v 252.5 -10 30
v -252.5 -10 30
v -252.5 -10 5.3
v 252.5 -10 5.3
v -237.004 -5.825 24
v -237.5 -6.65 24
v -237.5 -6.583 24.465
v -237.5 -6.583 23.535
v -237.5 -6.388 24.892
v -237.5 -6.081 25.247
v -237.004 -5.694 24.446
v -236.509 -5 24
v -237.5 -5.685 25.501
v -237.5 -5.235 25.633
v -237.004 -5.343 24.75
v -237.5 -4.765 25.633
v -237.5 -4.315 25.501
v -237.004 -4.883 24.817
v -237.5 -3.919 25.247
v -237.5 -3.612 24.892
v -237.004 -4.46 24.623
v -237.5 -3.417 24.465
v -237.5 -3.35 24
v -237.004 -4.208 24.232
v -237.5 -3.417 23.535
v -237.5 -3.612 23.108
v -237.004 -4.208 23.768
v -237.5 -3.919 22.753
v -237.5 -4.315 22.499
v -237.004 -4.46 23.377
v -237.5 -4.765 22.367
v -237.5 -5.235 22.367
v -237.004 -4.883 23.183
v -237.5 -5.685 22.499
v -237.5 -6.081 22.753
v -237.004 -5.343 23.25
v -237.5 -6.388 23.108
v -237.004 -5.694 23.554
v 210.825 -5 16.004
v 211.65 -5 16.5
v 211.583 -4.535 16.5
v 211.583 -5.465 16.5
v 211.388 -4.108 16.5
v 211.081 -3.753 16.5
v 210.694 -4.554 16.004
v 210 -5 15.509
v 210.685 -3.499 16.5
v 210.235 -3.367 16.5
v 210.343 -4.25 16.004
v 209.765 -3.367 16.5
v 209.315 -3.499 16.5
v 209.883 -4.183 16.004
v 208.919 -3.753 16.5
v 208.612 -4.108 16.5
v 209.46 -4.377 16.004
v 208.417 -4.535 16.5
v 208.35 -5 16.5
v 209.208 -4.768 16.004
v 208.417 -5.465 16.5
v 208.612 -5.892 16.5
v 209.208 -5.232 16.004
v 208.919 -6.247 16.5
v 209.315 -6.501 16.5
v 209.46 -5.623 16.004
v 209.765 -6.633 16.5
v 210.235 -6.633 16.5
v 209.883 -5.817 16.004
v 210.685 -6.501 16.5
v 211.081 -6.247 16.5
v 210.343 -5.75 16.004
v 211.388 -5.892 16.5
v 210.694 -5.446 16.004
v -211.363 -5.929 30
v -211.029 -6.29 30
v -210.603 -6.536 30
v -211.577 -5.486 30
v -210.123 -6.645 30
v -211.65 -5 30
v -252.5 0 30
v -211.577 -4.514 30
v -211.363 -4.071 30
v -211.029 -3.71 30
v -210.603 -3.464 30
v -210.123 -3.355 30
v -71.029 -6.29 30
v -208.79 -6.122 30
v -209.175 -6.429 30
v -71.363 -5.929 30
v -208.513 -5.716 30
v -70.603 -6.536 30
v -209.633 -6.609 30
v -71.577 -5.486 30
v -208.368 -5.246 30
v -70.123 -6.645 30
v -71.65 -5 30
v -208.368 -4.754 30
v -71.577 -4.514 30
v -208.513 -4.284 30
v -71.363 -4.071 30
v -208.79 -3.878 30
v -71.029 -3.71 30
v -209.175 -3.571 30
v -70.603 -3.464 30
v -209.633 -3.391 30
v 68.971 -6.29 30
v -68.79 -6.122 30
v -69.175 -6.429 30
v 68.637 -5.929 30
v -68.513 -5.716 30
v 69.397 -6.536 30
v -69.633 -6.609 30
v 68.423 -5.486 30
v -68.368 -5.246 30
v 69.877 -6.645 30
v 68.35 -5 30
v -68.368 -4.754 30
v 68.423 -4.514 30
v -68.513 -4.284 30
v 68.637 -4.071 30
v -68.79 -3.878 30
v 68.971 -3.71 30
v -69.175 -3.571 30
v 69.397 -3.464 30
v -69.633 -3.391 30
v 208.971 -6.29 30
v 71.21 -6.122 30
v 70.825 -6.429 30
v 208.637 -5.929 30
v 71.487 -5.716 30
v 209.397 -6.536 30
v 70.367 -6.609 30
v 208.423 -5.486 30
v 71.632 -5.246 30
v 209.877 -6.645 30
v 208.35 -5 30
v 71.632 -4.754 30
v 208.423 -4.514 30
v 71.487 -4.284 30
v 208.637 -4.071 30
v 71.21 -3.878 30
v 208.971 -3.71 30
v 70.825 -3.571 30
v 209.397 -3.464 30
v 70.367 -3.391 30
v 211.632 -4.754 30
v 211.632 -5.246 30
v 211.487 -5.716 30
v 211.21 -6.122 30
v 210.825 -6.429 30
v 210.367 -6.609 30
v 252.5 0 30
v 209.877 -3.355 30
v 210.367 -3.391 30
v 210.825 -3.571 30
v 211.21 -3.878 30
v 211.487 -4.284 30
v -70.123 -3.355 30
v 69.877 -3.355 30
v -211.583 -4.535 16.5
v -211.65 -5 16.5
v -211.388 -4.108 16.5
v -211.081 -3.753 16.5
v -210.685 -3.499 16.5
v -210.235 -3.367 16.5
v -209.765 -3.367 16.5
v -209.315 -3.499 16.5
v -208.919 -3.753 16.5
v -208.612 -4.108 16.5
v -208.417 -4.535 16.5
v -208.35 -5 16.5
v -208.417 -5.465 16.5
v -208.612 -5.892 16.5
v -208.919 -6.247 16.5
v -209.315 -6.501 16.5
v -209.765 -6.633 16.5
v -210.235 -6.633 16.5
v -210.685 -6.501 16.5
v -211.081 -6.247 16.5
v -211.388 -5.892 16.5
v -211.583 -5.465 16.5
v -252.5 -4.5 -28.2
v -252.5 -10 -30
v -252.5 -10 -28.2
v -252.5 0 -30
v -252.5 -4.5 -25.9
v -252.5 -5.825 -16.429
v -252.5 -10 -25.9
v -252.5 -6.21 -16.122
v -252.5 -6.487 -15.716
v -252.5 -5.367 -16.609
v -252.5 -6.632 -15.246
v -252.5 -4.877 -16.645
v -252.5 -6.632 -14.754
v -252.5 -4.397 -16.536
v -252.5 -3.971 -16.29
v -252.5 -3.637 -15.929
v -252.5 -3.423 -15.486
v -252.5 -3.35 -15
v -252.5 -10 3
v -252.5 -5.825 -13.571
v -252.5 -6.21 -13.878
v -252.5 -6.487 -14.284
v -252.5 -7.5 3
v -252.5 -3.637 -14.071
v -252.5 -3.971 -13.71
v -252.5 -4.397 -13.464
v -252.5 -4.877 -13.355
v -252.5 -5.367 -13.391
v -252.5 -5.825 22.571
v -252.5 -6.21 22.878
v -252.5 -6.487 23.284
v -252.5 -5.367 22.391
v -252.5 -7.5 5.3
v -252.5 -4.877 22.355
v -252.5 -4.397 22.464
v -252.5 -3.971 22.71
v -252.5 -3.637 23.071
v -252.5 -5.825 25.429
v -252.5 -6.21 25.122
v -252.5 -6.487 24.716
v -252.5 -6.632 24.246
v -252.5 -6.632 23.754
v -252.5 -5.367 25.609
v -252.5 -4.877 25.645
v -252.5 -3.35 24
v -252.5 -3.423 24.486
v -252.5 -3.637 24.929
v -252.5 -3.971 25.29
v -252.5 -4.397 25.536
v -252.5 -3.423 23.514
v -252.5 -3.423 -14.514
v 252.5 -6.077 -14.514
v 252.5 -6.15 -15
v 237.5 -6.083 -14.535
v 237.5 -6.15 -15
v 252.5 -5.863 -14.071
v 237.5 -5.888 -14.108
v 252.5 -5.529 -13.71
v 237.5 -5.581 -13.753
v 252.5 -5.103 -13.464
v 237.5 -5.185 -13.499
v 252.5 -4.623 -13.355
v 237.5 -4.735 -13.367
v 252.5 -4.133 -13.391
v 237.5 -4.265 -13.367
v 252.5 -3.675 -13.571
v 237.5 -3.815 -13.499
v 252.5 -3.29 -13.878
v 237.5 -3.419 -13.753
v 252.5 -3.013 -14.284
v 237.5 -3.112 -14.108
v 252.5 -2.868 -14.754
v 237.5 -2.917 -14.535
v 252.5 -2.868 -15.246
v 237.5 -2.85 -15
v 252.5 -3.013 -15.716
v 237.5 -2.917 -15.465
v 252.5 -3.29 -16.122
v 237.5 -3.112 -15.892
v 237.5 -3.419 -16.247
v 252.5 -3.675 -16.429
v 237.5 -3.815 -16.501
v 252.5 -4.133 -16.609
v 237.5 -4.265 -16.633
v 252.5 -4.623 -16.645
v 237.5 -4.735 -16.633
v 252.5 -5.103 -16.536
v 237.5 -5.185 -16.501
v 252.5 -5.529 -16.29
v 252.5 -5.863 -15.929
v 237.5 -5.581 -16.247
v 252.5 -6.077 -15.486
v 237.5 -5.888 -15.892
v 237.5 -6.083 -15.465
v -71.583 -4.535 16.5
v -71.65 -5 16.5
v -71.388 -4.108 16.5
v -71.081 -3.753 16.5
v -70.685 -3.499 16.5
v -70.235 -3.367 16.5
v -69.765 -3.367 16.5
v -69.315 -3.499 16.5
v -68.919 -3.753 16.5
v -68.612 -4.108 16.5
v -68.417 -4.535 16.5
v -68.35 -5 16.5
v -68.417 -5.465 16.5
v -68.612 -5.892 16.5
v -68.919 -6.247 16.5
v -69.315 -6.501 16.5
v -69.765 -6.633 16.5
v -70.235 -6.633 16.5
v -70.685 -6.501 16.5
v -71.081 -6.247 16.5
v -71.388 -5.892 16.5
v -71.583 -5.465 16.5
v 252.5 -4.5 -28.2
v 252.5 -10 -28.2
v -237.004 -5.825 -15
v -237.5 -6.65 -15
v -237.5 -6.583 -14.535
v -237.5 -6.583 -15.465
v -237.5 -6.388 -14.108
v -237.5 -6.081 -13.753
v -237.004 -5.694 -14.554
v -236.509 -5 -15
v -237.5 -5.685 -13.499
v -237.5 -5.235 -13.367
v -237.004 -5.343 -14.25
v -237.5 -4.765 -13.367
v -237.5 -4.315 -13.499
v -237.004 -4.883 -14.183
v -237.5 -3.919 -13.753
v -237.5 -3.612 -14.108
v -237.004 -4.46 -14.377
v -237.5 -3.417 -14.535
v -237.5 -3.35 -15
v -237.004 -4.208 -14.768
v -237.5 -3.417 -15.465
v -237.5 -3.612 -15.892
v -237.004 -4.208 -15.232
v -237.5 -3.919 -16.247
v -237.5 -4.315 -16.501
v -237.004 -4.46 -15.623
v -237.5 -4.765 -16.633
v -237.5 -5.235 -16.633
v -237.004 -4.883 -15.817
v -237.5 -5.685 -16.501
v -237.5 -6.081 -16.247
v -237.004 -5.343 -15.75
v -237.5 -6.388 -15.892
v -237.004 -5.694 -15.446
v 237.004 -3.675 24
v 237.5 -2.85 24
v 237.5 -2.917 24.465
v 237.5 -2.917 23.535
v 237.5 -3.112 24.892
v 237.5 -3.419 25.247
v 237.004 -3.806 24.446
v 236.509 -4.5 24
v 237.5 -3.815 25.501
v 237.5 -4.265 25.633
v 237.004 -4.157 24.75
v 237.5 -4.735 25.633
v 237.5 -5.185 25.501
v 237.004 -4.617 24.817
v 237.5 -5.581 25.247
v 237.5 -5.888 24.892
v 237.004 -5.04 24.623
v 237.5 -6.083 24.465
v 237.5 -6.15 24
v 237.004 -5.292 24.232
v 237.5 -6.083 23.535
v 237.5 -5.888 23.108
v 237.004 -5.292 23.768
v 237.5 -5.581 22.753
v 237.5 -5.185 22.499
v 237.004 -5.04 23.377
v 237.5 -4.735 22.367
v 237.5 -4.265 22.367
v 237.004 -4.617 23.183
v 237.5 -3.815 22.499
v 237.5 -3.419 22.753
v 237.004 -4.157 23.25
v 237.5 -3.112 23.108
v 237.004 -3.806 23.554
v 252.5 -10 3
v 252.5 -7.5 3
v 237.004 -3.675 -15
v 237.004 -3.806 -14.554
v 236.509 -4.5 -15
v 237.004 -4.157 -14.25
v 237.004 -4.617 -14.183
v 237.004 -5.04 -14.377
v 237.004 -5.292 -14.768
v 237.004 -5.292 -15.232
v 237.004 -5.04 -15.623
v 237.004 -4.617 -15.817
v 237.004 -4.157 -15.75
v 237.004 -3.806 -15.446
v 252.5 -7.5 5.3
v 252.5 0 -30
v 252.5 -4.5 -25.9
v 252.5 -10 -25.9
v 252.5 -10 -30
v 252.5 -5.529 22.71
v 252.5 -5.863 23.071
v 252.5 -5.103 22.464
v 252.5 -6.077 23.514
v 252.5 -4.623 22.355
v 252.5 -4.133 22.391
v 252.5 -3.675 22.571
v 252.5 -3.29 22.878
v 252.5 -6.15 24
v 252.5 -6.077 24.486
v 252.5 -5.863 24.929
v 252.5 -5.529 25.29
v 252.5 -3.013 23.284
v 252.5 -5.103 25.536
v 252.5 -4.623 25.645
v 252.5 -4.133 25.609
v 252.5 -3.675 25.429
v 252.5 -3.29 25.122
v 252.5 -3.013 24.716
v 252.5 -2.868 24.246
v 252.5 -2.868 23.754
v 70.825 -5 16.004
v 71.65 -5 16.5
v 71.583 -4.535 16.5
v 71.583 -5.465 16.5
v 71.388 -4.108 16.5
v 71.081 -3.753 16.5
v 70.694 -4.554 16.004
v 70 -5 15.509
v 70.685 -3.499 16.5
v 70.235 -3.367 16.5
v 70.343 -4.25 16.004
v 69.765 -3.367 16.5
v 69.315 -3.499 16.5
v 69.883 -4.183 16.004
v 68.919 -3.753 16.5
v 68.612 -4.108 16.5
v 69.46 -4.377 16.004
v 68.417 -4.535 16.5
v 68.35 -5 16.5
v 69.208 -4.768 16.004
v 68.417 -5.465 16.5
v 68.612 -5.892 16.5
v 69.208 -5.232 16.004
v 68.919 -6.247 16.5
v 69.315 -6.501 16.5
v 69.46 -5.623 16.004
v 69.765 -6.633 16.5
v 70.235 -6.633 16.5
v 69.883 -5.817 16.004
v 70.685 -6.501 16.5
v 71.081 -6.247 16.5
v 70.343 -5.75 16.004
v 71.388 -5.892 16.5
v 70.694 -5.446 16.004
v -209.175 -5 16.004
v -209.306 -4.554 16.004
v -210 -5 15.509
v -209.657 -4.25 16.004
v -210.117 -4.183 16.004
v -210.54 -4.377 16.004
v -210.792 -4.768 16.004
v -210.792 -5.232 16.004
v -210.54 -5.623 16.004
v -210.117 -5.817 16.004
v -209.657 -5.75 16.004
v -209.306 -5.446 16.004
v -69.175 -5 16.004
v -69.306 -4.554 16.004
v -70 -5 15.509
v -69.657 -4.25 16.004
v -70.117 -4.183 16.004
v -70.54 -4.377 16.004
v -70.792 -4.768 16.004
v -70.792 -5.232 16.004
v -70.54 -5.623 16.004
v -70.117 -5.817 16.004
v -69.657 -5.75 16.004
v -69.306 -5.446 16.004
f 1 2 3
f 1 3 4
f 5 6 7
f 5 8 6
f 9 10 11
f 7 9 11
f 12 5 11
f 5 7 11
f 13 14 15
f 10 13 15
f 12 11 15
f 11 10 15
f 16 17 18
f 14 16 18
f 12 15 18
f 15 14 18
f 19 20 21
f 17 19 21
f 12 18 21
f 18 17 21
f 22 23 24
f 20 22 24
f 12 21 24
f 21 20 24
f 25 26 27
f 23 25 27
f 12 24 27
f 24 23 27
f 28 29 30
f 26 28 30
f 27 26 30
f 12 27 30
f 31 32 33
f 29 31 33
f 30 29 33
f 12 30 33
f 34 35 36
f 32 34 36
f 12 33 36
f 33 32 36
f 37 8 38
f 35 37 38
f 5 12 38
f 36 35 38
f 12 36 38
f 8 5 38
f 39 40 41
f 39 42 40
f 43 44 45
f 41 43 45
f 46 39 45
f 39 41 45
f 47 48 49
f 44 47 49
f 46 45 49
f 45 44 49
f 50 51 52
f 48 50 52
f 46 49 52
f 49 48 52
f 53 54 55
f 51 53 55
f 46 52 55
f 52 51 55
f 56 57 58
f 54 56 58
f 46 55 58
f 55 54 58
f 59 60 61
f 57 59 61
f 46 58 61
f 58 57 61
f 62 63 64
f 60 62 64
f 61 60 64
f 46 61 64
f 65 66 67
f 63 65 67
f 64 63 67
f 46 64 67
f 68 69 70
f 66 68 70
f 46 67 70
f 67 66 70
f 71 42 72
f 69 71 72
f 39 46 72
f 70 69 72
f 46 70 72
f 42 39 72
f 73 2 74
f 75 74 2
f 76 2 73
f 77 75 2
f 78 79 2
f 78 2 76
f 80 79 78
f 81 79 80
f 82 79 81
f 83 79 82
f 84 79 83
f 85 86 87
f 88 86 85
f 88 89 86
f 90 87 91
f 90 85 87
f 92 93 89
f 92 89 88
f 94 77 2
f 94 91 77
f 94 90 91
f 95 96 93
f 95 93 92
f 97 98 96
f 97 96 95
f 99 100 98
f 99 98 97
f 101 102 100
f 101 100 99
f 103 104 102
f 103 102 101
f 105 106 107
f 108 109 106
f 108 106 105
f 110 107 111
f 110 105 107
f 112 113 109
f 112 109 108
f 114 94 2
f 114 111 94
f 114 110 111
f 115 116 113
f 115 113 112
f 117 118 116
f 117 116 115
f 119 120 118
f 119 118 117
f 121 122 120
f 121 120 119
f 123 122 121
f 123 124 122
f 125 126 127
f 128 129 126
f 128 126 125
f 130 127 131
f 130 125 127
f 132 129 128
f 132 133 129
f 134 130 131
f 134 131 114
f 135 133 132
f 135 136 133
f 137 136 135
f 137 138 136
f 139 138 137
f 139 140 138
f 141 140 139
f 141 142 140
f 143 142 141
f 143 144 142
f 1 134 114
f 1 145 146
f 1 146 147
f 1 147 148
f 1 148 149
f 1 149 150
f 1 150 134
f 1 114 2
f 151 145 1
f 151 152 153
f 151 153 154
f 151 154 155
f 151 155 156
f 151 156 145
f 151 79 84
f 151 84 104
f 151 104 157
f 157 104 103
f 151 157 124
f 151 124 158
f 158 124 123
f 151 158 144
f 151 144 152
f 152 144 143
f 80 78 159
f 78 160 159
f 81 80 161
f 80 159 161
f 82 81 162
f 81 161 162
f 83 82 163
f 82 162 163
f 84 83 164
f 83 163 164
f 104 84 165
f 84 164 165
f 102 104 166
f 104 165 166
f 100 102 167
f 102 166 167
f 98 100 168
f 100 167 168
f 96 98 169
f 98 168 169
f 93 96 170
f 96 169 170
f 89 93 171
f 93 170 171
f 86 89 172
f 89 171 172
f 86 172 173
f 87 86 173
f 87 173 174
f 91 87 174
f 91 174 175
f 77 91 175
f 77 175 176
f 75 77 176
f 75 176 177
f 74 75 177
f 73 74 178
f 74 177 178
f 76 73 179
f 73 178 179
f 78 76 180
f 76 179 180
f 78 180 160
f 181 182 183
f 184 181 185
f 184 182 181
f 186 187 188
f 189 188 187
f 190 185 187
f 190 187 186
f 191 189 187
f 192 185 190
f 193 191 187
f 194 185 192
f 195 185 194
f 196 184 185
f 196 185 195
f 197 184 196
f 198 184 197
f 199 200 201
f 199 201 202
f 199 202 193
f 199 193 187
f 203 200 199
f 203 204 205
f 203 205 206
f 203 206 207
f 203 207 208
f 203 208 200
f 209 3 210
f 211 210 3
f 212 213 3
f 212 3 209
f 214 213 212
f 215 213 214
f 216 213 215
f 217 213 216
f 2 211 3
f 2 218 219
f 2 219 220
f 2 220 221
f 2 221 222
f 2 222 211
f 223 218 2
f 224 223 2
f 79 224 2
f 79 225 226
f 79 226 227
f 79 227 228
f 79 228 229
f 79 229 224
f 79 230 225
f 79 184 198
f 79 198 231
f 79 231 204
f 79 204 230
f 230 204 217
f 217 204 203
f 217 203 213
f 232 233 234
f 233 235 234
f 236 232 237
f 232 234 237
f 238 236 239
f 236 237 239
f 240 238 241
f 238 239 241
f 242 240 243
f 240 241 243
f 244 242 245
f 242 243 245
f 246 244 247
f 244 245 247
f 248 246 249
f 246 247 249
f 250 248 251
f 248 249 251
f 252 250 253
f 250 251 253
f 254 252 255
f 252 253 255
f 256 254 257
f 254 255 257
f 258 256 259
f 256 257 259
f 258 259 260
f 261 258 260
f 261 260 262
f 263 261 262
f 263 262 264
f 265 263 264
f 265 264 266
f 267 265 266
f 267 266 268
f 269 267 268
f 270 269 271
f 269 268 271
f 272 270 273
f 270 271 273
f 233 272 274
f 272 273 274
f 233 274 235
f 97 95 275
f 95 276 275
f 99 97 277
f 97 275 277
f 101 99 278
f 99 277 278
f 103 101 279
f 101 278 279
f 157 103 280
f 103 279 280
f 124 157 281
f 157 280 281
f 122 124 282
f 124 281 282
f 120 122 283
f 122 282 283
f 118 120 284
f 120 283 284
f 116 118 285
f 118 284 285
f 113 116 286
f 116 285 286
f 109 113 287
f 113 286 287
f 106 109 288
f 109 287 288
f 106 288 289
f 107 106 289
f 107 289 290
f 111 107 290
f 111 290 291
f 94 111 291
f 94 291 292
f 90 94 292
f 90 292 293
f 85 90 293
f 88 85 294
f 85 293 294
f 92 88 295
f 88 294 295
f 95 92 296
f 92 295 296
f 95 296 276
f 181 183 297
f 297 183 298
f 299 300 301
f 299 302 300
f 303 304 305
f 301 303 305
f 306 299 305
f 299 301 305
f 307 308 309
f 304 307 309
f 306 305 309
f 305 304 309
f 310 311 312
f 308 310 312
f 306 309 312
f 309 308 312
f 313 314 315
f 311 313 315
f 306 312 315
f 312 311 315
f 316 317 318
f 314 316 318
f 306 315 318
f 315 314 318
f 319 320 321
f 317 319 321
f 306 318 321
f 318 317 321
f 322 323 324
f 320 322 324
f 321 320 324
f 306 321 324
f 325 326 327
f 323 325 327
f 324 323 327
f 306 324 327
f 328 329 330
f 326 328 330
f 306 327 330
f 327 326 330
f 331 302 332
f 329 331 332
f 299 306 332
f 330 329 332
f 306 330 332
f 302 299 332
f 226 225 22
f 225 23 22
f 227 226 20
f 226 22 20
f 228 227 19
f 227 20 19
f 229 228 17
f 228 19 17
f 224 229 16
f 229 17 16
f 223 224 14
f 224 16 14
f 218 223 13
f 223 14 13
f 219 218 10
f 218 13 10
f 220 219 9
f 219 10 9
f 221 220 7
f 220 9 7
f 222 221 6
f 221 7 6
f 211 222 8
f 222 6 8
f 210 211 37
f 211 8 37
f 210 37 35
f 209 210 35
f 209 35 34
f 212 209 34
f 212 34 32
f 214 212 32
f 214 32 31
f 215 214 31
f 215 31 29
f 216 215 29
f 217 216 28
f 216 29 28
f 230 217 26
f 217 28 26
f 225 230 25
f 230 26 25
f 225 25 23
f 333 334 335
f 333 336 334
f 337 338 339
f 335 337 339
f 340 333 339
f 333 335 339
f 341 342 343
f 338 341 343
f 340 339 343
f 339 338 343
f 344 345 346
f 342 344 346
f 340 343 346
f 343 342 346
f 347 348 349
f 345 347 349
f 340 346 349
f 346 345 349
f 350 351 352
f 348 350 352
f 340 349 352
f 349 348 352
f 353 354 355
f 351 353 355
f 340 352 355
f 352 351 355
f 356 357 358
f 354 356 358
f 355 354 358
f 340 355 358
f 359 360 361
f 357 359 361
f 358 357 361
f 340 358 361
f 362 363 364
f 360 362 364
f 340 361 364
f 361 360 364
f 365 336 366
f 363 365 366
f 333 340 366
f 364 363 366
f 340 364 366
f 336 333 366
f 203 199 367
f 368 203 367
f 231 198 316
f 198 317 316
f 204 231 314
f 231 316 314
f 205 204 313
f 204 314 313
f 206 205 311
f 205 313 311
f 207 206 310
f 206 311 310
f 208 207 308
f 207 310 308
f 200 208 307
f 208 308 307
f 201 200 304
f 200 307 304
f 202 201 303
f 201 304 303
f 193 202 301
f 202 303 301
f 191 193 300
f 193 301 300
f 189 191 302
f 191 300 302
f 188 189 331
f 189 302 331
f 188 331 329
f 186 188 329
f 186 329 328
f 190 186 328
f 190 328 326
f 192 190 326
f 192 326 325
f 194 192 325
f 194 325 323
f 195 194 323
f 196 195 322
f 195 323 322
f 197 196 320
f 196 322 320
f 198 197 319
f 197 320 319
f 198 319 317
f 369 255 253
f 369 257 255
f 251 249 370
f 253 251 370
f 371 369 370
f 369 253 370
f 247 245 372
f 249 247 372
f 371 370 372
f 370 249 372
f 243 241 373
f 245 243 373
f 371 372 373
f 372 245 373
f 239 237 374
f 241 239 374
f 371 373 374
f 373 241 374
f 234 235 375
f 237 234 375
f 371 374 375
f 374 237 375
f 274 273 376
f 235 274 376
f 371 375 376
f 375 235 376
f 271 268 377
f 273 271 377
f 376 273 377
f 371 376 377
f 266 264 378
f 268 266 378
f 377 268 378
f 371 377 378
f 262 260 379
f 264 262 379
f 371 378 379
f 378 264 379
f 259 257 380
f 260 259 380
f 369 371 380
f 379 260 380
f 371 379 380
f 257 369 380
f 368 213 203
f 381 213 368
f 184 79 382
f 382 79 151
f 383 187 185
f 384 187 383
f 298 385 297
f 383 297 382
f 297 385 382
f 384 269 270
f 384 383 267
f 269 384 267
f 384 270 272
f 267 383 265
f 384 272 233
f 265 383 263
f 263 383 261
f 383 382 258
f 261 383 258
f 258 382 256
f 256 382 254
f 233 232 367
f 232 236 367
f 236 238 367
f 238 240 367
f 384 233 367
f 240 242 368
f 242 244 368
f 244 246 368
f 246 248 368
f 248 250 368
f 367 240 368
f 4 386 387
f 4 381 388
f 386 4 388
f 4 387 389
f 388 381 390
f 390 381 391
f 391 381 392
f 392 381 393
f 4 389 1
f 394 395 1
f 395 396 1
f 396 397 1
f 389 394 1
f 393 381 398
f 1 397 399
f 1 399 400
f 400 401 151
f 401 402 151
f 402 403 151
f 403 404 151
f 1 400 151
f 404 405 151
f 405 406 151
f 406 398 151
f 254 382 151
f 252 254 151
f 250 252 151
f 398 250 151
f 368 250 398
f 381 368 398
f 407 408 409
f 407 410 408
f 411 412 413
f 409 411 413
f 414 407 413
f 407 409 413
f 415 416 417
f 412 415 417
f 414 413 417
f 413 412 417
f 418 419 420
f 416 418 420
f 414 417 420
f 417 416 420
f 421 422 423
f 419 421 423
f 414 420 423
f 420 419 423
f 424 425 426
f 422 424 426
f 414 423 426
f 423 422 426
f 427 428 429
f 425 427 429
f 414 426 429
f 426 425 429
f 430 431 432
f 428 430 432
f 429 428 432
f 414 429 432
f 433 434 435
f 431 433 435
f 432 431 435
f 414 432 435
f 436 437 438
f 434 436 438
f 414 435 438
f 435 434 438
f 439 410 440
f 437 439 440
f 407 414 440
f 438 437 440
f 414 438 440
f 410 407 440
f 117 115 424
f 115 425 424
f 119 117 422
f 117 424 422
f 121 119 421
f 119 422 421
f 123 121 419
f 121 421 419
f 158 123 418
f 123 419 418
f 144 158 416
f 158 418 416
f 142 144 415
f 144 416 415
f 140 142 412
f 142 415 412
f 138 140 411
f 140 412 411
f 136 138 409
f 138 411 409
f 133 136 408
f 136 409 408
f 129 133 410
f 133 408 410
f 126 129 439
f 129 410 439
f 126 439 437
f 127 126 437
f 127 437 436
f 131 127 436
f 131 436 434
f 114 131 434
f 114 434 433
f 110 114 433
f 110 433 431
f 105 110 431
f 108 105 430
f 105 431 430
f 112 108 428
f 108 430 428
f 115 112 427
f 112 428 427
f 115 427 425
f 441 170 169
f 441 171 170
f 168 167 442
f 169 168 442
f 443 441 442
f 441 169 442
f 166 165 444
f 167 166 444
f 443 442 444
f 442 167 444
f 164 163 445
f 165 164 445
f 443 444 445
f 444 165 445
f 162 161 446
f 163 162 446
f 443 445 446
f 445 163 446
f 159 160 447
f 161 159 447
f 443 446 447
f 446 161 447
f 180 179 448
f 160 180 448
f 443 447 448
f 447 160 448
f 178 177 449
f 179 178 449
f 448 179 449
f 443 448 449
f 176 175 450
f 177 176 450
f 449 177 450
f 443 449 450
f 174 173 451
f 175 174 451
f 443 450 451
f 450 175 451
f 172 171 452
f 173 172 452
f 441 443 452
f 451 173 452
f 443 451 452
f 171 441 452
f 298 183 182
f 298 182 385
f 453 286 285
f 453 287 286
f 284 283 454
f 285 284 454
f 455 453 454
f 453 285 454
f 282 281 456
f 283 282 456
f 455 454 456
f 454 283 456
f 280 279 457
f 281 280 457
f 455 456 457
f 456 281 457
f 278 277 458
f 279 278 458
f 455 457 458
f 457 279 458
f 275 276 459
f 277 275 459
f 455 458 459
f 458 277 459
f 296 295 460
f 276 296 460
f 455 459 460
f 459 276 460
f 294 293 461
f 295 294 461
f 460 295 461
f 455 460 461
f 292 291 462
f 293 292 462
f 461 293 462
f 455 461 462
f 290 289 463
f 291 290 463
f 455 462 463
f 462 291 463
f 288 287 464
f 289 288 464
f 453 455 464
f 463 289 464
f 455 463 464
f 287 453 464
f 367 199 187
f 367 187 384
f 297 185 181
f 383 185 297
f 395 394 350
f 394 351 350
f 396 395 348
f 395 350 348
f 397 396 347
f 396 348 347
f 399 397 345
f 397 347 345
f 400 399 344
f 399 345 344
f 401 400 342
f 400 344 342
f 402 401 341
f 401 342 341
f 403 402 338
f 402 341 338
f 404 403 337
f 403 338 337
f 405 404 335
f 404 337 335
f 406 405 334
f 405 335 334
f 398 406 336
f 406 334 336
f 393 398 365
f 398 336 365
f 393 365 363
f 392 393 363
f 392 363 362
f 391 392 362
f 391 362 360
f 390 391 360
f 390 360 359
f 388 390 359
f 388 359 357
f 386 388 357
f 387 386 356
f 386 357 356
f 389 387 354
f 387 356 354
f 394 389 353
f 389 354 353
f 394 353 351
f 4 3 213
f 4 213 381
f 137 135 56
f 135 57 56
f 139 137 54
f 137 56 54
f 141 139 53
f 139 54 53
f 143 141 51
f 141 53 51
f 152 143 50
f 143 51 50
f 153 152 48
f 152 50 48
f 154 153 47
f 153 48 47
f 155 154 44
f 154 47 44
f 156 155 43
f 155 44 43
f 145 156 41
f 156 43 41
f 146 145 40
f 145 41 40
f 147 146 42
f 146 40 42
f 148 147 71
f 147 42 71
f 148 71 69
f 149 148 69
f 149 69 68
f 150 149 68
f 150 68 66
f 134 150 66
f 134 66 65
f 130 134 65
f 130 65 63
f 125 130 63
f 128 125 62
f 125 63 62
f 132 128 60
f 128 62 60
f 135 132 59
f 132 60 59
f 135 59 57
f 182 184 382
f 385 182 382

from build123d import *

# Parameters (mm, degrees)
F0_W      = 505
F0_H      = 60
F1_DEPTH  = 10
F2_W      = 505
F2_H      = 2.3
F3_DEPTH  = 5.5
F4_W      = 505
F4_H      = 2.3
F5_DEPTH  = 2.5
F7_D      = 3.3
F7_DEPTH  = 13.5
F7_TIP    = 0.9914200214
F9_D      = 3.3
F9_DEPTH  = 15
F9_TIP    = 0.9914200214
F11_D     = 3.3
F11_DEPTH = 15
F11_TIP   = 0.9914200214


with BuildPart() as f1:
    # F0 (on Front) → F1 (new body)
    with BuildSketch(Plane.XZ):
        Rectangle(F0_W, F0_H)
    extrude(amount=F1_DEPTH)

    # F2 (on face) → F3 (cut)
    with BuildSketch(Plane.XZ.offset(10)):
        with Locations((0, -27.05)):
            Rectangle(F2_W, F2_H)
    extrude(amount=-F3_DEPTH, mode=Mode.SUBTRACT)

    # F4 (on face) → F5 (cut)
    with BuildSketch(Plane.XZ.offset(10)):
        with Locations((0, 4.15)):
            Rectangle(F4_W, F4_H)
    extrude(amount=-F5_DEPTH, mode=Mode.SUBTRACT)

    # F7
    with Locations(Plane.XY.offset(30)):
        with Locations((-210, -5), (-70, -5), (70, -5), (210, -5)):
            Hole(F7_D / 2, depth=F7_DEPTH)
            with Locations((0, 0, -(F7_DEPTH + F7_TIP / 2))):  # 118° drill point
                Cone(0, F7_D / 2, F7_TIP, mode=Mode.SUBTRACT)

    # F9
    with Locations(Plane(origin=(-252.5, 0, 0), x_dir=(0, -1, 0), z_dir=(-1, 0, 0))):
        with Locations((5, 24), (5, -15)):
            Hole(F9_D / 2, depth=F9_DEPTH)
            with Locations((0, 0, -(F9_DEPTH + F9_TIP / 2))):  # 118° drill point
                Cone(0, F9_D / 2, F9_TIP, mode=Mode.SUBTRACT)

    # F11
    with Locations(Plane.YZ.offset(252.5)):
        with Locations((-4.5, -15), (-4.5, 24)):
            Hole(F11_D / 2, depth=F11_DEPTH)
            with Locations((0, 0, -(F11_DEPTH + F11_TIP / 2))):  # 118° drill point
                Cone(0, F11_D / 2, F11_TIP, mode=Mode.SUBTRACT)


solid = f1.part
